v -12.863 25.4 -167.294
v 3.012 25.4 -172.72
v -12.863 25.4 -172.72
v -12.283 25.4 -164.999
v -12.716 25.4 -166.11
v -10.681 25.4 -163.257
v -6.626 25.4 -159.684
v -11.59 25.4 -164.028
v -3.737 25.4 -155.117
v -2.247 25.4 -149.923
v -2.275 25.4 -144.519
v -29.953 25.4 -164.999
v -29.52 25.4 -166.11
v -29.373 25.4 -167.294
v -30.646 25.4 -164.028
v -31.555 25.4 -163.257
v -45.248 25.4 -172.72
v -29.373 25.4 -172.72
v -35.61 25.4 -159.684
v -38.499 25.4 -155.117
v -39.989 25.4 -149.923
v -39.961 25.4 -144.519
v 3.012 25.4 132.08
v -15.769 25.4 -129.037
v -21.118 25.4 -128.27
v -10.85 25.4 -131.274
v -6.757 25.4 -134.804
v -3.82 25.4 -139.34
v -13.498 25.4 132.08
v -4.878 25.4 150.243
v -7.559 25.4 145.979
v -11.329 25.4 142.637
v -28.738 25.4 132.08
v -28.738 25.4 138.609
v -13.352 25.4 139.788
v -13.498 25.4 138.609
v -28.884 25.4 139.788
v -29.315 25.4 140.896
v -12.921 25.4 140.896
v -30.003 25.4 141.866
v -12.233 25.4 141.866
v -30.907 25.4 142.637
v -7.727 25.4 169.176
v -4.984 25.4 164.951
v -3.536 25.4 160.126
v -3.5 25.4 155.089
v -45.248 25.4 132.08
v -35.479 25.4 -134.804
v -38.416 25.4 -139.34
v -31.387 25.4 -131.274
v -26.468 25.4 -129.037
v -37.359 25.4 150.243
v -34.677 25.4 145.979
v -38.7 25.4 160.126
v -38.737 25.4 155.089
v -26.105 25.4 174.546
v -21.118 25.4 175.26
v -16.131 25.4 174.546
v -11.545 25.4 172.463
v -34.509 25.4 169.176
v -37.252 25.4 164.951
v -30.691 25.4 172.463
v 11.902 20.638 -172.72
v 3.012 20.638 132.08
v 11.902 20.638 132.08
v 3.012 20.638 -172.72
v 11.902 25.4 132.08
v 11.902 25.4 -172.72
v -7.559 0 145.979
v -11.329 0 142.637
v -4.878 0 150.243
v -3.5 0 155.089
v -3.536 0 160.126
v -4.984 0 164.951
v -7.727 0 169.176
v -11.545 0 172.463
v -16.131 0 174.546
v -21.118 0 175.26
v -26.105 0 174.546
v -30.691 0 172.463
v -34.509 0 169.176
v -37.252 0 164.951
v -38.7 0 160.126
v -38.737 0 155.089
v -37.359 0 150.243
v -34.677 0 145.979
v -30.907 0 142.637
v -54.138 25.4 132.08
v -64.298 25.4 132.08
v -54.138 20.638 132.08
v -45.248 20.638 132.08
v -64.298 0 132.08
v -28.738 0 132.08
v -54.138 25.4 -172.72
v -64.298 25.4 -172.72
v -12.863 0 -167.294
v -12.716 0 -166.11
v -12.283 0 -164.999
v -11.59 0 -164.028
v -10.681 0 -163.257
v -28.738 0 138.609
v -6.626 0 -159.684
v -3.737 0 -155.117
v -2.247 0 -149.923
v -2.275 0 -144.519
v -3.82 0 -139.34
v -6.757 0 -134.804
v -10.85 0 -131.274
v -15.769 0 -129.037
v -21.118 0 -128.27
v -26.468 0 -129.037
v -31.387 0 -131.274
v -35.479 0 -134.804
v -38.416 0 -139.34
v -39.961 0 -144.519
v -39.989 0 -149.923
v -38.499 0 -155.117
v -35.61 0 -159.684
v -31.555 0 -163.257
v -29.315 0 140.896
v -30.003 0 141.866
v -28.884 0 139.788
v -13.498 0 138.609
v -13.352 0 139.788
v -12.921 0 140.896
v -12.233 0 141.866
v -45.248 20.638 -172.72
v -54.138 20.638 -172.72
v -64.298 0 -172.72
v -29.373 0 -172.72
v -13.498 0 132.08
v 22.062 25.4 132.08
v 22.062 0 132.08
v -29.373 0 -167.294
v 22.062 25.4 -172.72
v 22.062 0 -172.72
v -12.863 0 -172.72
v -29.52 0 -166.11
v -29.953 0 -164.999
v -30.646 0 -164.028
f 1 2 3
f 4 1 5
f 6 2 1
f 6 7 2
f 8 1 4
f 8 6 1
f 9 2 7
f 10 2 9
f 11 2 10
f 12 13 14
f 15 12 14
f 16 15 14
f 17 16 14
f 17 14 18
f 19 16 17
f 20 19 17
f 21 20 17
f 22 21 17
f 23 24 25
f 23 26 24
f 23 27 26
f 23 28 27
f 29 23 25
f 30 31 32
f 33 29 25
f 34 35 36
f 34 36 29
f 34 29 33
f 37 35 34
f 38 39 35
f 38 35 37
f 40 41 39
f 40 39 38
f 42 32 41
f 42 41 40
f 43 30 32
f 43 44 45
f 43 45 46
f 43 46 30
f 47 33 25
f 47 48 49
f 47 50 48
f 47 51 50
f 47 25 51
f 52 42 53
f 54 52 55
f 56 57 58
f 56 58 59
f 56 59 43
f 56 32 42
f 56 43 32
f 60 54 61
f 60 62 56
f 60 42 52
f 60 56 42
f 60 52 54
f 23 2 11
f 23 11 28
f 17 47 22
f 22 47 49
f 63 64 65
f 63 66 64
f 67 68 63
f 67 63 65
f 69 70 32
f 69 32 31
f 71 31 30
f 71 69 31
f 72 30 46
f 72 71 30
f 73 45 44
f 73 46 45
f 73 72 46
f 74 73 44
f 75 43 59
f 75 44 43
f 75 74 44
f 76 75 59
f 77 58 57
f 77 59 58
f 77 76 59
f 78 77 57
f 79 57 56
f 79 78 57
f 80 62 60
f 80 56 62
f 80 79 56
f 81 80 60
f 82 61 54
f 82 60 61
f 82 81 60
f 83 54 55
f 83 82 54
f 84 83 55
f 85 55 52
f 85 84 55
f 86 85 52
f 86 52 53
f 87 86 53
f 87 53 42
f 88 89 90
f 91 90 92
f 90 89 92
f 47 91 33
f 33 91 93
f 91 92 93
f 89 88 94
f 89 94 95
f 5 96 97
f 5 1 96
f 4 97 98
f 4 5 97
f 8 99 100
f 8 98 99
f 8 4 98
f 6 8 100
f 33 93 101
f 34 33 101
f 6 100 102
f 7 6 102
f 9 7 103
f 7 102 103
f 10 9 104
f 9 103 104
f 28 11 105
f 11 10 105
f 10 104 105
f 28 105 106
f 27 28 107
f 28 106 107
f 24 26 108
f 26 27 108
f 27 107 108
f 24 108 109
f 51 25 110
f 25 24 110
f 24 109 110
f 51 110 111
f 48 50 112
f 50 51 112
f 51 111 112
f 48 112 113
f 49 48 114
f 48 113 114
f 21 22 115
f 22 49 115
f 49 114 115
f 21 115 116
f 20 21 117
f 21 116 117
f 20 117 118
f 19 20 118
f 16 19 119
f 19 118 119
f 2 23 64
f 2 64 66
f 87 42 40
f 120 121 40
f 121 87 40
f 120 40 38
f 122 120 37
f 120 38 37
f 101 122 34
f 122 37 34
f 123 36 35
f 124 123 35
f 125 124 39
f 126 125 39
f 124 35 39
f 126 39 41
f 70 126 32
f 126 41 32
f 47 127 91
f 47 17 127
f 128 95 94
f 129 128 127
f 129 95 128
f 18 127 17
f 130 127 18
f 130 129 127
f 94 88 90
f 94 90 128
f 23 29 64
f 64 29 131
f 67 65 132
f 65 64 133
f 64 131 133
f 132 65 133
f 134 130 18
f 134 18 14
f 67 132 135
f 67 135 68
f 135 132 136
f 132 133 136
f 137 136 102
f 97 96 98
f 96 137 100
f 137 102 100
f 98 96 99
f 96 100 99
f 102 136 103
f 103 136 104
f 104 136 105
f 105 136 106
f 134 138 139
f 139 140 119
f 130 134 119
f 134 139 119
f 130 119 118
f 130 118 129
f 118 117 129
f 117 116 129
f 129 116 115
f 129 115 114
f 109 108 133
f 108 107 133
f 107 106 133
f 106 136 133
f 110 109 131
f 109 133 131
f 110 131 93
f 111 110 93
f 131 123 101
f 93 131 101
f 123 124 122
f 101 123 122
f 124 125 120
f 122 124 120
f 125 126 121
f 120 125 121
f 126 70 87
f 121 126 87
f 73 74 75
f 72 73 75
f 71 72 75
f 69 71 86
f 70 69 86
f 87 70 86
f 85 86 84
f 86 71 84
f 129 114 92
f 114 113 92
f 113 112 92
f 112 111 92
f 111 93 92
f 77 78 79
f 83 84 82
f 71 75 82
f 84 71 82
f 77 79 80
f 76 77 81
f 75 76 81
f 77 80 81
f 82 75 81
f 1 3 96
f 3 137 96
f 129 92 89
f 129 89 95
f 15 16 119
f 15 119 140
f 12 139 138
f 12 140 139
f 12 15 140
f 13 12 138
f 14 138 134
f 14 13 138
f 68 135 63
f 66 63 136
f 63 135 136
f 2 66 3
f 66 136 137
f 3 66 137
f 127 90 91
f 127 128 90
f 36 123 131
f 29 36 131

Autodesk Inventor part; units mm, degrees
ref_plane "YZ Plane" through (0, 0, 0) normal (1, 0, 0) x (0, 1, 0)
ref_plane "XZ Plane" through (0, 0, 0) normal (0, 1, 0) x (-1, 0, 0)
ref_plane "XY Plane" through (0, 0, 0) normal (0, 0, 1) x (1, 0, 0)
sketch "Sketch1" plane through (0, 0, 0) normal (0, 1, 0) x (-1, 0, 0)
  line L0 (64.2981, 132.08) -> (64.2981, -172.72)
  line L1 (64.2981, -172.72) -> (29.3731, -172.72)
  line L2 (29.3731, -172.72) -> (29.3731, -164.4885)
  line L3 (64.2981, 132.08) -> (28.7381, 132.08)
  line L4 (28.7381, 132.08) -> (28.7381, 141.4156)
  line L5 (13.4981, 141.4156) -> (13.4981, 132.08)
  line L6 (13.4981, 132.08) -> (-22.0619, 132.08)
  line L7 (-22.0619, 132.08) -> (-22.0619, -172.72)
  line L8 (-22.0619, -172.72) -> (12.8631, -172.72)
  line L9 (12.8631, -172.72) -> (12.8631, -164.4885)
  arc A0 (28.7381, 141.4156) -> (13.4981, 141.4156) centre (21.1181, 157.48) ccw
  arc A1 (29.3731, -164.4885) -> (12.8631, -164.4885) centre (21.1181, -147.32) ccw
  point P0 (0, 0)
  dimension "d0" = 86.36
  dimension "d1" = 19.05
  dimension "d2" = 17.78
  dimension "d3" = 25.4
  dimension "d4" = 25.4
  dimension "d5" = 304.8
  dimension "d6" = 304.8
  dimension "d7" = 0
  dimension "d8" = 34.925
  dimension "d9" = 51.435
  dimension "d10" = 43.18
  dimension "d13" = 43.18
  dimension "d16" = 15.24
  dimension "d17" = 7.62
extrude "Extrusion1" add sketch "Sketch1" along normal blind 25.4
sketch "Sketch2" plane through (0, 25.4, 0) normal (0, 1, 0) x (1, 0, 0)
  line L0 (-64.2981, -132.08) -> (-28.7381, -132.08) projected
  line L1 (-13.4981, -132.08) -> (22.0619, -132.08) projected
  line L2 (-29.3731, 172.72) -> (-64.2981, 172.72) projected
  line L3 (22.0619, 172.72) -> (-12.8631, 172.72) projected
  line L4 (-64.2981, 172.72) -> (-64.2981, -132.08) projected
  line L5 (22.0619, -132.08) -> (22.0619, 172.72) projected
  line L6 (-54.1381, -132.08) -> (-54.1381, 172.72)
  line L7 (-64.2981, 172.72) -> (-29.3731, 172.72) projected
  line L8 (-45.2481, 172.72) -> (-45.2481, -132.08)
  line L9 (-54.1381, -132.08) -> (-45.2481, -132.08)
  line L10 (-54.1381, 172.72) -> (-45.2481, 172.72)
  line L11 (3.0119, -132.08) -> (3.0119, 172.72)
  line L12 (11.9019, 172.72) -> (11.9019, -132.08)
  line L13 (3.0119, -132.08) -> (11.9019, -132.08)
  line L14 (3.0119, 172.72) -> (11.9019, 172.72)
  point P0 (0, 0)
  dimension "d21" = 10.16
  dimension "d22" = 19.05
  dimension "d23" = 67.31
  dimension "d24" = 76.2
extrude "Extrusion2" cut sketch "Sketch2" against normal blind 4.7625 contours L6 L2 L8 L0 | L11 L3 L12 L1
fillet "Fillet1" radius 4.826 4 edges at (-28.7381, 12.7, 141.4156) (-13.4981, 12.7, 141.4156) (-29.3731, 12.7, -164.4885) (-12.8631, 12.7, -164.4885)
properties part number "Straight Track"
